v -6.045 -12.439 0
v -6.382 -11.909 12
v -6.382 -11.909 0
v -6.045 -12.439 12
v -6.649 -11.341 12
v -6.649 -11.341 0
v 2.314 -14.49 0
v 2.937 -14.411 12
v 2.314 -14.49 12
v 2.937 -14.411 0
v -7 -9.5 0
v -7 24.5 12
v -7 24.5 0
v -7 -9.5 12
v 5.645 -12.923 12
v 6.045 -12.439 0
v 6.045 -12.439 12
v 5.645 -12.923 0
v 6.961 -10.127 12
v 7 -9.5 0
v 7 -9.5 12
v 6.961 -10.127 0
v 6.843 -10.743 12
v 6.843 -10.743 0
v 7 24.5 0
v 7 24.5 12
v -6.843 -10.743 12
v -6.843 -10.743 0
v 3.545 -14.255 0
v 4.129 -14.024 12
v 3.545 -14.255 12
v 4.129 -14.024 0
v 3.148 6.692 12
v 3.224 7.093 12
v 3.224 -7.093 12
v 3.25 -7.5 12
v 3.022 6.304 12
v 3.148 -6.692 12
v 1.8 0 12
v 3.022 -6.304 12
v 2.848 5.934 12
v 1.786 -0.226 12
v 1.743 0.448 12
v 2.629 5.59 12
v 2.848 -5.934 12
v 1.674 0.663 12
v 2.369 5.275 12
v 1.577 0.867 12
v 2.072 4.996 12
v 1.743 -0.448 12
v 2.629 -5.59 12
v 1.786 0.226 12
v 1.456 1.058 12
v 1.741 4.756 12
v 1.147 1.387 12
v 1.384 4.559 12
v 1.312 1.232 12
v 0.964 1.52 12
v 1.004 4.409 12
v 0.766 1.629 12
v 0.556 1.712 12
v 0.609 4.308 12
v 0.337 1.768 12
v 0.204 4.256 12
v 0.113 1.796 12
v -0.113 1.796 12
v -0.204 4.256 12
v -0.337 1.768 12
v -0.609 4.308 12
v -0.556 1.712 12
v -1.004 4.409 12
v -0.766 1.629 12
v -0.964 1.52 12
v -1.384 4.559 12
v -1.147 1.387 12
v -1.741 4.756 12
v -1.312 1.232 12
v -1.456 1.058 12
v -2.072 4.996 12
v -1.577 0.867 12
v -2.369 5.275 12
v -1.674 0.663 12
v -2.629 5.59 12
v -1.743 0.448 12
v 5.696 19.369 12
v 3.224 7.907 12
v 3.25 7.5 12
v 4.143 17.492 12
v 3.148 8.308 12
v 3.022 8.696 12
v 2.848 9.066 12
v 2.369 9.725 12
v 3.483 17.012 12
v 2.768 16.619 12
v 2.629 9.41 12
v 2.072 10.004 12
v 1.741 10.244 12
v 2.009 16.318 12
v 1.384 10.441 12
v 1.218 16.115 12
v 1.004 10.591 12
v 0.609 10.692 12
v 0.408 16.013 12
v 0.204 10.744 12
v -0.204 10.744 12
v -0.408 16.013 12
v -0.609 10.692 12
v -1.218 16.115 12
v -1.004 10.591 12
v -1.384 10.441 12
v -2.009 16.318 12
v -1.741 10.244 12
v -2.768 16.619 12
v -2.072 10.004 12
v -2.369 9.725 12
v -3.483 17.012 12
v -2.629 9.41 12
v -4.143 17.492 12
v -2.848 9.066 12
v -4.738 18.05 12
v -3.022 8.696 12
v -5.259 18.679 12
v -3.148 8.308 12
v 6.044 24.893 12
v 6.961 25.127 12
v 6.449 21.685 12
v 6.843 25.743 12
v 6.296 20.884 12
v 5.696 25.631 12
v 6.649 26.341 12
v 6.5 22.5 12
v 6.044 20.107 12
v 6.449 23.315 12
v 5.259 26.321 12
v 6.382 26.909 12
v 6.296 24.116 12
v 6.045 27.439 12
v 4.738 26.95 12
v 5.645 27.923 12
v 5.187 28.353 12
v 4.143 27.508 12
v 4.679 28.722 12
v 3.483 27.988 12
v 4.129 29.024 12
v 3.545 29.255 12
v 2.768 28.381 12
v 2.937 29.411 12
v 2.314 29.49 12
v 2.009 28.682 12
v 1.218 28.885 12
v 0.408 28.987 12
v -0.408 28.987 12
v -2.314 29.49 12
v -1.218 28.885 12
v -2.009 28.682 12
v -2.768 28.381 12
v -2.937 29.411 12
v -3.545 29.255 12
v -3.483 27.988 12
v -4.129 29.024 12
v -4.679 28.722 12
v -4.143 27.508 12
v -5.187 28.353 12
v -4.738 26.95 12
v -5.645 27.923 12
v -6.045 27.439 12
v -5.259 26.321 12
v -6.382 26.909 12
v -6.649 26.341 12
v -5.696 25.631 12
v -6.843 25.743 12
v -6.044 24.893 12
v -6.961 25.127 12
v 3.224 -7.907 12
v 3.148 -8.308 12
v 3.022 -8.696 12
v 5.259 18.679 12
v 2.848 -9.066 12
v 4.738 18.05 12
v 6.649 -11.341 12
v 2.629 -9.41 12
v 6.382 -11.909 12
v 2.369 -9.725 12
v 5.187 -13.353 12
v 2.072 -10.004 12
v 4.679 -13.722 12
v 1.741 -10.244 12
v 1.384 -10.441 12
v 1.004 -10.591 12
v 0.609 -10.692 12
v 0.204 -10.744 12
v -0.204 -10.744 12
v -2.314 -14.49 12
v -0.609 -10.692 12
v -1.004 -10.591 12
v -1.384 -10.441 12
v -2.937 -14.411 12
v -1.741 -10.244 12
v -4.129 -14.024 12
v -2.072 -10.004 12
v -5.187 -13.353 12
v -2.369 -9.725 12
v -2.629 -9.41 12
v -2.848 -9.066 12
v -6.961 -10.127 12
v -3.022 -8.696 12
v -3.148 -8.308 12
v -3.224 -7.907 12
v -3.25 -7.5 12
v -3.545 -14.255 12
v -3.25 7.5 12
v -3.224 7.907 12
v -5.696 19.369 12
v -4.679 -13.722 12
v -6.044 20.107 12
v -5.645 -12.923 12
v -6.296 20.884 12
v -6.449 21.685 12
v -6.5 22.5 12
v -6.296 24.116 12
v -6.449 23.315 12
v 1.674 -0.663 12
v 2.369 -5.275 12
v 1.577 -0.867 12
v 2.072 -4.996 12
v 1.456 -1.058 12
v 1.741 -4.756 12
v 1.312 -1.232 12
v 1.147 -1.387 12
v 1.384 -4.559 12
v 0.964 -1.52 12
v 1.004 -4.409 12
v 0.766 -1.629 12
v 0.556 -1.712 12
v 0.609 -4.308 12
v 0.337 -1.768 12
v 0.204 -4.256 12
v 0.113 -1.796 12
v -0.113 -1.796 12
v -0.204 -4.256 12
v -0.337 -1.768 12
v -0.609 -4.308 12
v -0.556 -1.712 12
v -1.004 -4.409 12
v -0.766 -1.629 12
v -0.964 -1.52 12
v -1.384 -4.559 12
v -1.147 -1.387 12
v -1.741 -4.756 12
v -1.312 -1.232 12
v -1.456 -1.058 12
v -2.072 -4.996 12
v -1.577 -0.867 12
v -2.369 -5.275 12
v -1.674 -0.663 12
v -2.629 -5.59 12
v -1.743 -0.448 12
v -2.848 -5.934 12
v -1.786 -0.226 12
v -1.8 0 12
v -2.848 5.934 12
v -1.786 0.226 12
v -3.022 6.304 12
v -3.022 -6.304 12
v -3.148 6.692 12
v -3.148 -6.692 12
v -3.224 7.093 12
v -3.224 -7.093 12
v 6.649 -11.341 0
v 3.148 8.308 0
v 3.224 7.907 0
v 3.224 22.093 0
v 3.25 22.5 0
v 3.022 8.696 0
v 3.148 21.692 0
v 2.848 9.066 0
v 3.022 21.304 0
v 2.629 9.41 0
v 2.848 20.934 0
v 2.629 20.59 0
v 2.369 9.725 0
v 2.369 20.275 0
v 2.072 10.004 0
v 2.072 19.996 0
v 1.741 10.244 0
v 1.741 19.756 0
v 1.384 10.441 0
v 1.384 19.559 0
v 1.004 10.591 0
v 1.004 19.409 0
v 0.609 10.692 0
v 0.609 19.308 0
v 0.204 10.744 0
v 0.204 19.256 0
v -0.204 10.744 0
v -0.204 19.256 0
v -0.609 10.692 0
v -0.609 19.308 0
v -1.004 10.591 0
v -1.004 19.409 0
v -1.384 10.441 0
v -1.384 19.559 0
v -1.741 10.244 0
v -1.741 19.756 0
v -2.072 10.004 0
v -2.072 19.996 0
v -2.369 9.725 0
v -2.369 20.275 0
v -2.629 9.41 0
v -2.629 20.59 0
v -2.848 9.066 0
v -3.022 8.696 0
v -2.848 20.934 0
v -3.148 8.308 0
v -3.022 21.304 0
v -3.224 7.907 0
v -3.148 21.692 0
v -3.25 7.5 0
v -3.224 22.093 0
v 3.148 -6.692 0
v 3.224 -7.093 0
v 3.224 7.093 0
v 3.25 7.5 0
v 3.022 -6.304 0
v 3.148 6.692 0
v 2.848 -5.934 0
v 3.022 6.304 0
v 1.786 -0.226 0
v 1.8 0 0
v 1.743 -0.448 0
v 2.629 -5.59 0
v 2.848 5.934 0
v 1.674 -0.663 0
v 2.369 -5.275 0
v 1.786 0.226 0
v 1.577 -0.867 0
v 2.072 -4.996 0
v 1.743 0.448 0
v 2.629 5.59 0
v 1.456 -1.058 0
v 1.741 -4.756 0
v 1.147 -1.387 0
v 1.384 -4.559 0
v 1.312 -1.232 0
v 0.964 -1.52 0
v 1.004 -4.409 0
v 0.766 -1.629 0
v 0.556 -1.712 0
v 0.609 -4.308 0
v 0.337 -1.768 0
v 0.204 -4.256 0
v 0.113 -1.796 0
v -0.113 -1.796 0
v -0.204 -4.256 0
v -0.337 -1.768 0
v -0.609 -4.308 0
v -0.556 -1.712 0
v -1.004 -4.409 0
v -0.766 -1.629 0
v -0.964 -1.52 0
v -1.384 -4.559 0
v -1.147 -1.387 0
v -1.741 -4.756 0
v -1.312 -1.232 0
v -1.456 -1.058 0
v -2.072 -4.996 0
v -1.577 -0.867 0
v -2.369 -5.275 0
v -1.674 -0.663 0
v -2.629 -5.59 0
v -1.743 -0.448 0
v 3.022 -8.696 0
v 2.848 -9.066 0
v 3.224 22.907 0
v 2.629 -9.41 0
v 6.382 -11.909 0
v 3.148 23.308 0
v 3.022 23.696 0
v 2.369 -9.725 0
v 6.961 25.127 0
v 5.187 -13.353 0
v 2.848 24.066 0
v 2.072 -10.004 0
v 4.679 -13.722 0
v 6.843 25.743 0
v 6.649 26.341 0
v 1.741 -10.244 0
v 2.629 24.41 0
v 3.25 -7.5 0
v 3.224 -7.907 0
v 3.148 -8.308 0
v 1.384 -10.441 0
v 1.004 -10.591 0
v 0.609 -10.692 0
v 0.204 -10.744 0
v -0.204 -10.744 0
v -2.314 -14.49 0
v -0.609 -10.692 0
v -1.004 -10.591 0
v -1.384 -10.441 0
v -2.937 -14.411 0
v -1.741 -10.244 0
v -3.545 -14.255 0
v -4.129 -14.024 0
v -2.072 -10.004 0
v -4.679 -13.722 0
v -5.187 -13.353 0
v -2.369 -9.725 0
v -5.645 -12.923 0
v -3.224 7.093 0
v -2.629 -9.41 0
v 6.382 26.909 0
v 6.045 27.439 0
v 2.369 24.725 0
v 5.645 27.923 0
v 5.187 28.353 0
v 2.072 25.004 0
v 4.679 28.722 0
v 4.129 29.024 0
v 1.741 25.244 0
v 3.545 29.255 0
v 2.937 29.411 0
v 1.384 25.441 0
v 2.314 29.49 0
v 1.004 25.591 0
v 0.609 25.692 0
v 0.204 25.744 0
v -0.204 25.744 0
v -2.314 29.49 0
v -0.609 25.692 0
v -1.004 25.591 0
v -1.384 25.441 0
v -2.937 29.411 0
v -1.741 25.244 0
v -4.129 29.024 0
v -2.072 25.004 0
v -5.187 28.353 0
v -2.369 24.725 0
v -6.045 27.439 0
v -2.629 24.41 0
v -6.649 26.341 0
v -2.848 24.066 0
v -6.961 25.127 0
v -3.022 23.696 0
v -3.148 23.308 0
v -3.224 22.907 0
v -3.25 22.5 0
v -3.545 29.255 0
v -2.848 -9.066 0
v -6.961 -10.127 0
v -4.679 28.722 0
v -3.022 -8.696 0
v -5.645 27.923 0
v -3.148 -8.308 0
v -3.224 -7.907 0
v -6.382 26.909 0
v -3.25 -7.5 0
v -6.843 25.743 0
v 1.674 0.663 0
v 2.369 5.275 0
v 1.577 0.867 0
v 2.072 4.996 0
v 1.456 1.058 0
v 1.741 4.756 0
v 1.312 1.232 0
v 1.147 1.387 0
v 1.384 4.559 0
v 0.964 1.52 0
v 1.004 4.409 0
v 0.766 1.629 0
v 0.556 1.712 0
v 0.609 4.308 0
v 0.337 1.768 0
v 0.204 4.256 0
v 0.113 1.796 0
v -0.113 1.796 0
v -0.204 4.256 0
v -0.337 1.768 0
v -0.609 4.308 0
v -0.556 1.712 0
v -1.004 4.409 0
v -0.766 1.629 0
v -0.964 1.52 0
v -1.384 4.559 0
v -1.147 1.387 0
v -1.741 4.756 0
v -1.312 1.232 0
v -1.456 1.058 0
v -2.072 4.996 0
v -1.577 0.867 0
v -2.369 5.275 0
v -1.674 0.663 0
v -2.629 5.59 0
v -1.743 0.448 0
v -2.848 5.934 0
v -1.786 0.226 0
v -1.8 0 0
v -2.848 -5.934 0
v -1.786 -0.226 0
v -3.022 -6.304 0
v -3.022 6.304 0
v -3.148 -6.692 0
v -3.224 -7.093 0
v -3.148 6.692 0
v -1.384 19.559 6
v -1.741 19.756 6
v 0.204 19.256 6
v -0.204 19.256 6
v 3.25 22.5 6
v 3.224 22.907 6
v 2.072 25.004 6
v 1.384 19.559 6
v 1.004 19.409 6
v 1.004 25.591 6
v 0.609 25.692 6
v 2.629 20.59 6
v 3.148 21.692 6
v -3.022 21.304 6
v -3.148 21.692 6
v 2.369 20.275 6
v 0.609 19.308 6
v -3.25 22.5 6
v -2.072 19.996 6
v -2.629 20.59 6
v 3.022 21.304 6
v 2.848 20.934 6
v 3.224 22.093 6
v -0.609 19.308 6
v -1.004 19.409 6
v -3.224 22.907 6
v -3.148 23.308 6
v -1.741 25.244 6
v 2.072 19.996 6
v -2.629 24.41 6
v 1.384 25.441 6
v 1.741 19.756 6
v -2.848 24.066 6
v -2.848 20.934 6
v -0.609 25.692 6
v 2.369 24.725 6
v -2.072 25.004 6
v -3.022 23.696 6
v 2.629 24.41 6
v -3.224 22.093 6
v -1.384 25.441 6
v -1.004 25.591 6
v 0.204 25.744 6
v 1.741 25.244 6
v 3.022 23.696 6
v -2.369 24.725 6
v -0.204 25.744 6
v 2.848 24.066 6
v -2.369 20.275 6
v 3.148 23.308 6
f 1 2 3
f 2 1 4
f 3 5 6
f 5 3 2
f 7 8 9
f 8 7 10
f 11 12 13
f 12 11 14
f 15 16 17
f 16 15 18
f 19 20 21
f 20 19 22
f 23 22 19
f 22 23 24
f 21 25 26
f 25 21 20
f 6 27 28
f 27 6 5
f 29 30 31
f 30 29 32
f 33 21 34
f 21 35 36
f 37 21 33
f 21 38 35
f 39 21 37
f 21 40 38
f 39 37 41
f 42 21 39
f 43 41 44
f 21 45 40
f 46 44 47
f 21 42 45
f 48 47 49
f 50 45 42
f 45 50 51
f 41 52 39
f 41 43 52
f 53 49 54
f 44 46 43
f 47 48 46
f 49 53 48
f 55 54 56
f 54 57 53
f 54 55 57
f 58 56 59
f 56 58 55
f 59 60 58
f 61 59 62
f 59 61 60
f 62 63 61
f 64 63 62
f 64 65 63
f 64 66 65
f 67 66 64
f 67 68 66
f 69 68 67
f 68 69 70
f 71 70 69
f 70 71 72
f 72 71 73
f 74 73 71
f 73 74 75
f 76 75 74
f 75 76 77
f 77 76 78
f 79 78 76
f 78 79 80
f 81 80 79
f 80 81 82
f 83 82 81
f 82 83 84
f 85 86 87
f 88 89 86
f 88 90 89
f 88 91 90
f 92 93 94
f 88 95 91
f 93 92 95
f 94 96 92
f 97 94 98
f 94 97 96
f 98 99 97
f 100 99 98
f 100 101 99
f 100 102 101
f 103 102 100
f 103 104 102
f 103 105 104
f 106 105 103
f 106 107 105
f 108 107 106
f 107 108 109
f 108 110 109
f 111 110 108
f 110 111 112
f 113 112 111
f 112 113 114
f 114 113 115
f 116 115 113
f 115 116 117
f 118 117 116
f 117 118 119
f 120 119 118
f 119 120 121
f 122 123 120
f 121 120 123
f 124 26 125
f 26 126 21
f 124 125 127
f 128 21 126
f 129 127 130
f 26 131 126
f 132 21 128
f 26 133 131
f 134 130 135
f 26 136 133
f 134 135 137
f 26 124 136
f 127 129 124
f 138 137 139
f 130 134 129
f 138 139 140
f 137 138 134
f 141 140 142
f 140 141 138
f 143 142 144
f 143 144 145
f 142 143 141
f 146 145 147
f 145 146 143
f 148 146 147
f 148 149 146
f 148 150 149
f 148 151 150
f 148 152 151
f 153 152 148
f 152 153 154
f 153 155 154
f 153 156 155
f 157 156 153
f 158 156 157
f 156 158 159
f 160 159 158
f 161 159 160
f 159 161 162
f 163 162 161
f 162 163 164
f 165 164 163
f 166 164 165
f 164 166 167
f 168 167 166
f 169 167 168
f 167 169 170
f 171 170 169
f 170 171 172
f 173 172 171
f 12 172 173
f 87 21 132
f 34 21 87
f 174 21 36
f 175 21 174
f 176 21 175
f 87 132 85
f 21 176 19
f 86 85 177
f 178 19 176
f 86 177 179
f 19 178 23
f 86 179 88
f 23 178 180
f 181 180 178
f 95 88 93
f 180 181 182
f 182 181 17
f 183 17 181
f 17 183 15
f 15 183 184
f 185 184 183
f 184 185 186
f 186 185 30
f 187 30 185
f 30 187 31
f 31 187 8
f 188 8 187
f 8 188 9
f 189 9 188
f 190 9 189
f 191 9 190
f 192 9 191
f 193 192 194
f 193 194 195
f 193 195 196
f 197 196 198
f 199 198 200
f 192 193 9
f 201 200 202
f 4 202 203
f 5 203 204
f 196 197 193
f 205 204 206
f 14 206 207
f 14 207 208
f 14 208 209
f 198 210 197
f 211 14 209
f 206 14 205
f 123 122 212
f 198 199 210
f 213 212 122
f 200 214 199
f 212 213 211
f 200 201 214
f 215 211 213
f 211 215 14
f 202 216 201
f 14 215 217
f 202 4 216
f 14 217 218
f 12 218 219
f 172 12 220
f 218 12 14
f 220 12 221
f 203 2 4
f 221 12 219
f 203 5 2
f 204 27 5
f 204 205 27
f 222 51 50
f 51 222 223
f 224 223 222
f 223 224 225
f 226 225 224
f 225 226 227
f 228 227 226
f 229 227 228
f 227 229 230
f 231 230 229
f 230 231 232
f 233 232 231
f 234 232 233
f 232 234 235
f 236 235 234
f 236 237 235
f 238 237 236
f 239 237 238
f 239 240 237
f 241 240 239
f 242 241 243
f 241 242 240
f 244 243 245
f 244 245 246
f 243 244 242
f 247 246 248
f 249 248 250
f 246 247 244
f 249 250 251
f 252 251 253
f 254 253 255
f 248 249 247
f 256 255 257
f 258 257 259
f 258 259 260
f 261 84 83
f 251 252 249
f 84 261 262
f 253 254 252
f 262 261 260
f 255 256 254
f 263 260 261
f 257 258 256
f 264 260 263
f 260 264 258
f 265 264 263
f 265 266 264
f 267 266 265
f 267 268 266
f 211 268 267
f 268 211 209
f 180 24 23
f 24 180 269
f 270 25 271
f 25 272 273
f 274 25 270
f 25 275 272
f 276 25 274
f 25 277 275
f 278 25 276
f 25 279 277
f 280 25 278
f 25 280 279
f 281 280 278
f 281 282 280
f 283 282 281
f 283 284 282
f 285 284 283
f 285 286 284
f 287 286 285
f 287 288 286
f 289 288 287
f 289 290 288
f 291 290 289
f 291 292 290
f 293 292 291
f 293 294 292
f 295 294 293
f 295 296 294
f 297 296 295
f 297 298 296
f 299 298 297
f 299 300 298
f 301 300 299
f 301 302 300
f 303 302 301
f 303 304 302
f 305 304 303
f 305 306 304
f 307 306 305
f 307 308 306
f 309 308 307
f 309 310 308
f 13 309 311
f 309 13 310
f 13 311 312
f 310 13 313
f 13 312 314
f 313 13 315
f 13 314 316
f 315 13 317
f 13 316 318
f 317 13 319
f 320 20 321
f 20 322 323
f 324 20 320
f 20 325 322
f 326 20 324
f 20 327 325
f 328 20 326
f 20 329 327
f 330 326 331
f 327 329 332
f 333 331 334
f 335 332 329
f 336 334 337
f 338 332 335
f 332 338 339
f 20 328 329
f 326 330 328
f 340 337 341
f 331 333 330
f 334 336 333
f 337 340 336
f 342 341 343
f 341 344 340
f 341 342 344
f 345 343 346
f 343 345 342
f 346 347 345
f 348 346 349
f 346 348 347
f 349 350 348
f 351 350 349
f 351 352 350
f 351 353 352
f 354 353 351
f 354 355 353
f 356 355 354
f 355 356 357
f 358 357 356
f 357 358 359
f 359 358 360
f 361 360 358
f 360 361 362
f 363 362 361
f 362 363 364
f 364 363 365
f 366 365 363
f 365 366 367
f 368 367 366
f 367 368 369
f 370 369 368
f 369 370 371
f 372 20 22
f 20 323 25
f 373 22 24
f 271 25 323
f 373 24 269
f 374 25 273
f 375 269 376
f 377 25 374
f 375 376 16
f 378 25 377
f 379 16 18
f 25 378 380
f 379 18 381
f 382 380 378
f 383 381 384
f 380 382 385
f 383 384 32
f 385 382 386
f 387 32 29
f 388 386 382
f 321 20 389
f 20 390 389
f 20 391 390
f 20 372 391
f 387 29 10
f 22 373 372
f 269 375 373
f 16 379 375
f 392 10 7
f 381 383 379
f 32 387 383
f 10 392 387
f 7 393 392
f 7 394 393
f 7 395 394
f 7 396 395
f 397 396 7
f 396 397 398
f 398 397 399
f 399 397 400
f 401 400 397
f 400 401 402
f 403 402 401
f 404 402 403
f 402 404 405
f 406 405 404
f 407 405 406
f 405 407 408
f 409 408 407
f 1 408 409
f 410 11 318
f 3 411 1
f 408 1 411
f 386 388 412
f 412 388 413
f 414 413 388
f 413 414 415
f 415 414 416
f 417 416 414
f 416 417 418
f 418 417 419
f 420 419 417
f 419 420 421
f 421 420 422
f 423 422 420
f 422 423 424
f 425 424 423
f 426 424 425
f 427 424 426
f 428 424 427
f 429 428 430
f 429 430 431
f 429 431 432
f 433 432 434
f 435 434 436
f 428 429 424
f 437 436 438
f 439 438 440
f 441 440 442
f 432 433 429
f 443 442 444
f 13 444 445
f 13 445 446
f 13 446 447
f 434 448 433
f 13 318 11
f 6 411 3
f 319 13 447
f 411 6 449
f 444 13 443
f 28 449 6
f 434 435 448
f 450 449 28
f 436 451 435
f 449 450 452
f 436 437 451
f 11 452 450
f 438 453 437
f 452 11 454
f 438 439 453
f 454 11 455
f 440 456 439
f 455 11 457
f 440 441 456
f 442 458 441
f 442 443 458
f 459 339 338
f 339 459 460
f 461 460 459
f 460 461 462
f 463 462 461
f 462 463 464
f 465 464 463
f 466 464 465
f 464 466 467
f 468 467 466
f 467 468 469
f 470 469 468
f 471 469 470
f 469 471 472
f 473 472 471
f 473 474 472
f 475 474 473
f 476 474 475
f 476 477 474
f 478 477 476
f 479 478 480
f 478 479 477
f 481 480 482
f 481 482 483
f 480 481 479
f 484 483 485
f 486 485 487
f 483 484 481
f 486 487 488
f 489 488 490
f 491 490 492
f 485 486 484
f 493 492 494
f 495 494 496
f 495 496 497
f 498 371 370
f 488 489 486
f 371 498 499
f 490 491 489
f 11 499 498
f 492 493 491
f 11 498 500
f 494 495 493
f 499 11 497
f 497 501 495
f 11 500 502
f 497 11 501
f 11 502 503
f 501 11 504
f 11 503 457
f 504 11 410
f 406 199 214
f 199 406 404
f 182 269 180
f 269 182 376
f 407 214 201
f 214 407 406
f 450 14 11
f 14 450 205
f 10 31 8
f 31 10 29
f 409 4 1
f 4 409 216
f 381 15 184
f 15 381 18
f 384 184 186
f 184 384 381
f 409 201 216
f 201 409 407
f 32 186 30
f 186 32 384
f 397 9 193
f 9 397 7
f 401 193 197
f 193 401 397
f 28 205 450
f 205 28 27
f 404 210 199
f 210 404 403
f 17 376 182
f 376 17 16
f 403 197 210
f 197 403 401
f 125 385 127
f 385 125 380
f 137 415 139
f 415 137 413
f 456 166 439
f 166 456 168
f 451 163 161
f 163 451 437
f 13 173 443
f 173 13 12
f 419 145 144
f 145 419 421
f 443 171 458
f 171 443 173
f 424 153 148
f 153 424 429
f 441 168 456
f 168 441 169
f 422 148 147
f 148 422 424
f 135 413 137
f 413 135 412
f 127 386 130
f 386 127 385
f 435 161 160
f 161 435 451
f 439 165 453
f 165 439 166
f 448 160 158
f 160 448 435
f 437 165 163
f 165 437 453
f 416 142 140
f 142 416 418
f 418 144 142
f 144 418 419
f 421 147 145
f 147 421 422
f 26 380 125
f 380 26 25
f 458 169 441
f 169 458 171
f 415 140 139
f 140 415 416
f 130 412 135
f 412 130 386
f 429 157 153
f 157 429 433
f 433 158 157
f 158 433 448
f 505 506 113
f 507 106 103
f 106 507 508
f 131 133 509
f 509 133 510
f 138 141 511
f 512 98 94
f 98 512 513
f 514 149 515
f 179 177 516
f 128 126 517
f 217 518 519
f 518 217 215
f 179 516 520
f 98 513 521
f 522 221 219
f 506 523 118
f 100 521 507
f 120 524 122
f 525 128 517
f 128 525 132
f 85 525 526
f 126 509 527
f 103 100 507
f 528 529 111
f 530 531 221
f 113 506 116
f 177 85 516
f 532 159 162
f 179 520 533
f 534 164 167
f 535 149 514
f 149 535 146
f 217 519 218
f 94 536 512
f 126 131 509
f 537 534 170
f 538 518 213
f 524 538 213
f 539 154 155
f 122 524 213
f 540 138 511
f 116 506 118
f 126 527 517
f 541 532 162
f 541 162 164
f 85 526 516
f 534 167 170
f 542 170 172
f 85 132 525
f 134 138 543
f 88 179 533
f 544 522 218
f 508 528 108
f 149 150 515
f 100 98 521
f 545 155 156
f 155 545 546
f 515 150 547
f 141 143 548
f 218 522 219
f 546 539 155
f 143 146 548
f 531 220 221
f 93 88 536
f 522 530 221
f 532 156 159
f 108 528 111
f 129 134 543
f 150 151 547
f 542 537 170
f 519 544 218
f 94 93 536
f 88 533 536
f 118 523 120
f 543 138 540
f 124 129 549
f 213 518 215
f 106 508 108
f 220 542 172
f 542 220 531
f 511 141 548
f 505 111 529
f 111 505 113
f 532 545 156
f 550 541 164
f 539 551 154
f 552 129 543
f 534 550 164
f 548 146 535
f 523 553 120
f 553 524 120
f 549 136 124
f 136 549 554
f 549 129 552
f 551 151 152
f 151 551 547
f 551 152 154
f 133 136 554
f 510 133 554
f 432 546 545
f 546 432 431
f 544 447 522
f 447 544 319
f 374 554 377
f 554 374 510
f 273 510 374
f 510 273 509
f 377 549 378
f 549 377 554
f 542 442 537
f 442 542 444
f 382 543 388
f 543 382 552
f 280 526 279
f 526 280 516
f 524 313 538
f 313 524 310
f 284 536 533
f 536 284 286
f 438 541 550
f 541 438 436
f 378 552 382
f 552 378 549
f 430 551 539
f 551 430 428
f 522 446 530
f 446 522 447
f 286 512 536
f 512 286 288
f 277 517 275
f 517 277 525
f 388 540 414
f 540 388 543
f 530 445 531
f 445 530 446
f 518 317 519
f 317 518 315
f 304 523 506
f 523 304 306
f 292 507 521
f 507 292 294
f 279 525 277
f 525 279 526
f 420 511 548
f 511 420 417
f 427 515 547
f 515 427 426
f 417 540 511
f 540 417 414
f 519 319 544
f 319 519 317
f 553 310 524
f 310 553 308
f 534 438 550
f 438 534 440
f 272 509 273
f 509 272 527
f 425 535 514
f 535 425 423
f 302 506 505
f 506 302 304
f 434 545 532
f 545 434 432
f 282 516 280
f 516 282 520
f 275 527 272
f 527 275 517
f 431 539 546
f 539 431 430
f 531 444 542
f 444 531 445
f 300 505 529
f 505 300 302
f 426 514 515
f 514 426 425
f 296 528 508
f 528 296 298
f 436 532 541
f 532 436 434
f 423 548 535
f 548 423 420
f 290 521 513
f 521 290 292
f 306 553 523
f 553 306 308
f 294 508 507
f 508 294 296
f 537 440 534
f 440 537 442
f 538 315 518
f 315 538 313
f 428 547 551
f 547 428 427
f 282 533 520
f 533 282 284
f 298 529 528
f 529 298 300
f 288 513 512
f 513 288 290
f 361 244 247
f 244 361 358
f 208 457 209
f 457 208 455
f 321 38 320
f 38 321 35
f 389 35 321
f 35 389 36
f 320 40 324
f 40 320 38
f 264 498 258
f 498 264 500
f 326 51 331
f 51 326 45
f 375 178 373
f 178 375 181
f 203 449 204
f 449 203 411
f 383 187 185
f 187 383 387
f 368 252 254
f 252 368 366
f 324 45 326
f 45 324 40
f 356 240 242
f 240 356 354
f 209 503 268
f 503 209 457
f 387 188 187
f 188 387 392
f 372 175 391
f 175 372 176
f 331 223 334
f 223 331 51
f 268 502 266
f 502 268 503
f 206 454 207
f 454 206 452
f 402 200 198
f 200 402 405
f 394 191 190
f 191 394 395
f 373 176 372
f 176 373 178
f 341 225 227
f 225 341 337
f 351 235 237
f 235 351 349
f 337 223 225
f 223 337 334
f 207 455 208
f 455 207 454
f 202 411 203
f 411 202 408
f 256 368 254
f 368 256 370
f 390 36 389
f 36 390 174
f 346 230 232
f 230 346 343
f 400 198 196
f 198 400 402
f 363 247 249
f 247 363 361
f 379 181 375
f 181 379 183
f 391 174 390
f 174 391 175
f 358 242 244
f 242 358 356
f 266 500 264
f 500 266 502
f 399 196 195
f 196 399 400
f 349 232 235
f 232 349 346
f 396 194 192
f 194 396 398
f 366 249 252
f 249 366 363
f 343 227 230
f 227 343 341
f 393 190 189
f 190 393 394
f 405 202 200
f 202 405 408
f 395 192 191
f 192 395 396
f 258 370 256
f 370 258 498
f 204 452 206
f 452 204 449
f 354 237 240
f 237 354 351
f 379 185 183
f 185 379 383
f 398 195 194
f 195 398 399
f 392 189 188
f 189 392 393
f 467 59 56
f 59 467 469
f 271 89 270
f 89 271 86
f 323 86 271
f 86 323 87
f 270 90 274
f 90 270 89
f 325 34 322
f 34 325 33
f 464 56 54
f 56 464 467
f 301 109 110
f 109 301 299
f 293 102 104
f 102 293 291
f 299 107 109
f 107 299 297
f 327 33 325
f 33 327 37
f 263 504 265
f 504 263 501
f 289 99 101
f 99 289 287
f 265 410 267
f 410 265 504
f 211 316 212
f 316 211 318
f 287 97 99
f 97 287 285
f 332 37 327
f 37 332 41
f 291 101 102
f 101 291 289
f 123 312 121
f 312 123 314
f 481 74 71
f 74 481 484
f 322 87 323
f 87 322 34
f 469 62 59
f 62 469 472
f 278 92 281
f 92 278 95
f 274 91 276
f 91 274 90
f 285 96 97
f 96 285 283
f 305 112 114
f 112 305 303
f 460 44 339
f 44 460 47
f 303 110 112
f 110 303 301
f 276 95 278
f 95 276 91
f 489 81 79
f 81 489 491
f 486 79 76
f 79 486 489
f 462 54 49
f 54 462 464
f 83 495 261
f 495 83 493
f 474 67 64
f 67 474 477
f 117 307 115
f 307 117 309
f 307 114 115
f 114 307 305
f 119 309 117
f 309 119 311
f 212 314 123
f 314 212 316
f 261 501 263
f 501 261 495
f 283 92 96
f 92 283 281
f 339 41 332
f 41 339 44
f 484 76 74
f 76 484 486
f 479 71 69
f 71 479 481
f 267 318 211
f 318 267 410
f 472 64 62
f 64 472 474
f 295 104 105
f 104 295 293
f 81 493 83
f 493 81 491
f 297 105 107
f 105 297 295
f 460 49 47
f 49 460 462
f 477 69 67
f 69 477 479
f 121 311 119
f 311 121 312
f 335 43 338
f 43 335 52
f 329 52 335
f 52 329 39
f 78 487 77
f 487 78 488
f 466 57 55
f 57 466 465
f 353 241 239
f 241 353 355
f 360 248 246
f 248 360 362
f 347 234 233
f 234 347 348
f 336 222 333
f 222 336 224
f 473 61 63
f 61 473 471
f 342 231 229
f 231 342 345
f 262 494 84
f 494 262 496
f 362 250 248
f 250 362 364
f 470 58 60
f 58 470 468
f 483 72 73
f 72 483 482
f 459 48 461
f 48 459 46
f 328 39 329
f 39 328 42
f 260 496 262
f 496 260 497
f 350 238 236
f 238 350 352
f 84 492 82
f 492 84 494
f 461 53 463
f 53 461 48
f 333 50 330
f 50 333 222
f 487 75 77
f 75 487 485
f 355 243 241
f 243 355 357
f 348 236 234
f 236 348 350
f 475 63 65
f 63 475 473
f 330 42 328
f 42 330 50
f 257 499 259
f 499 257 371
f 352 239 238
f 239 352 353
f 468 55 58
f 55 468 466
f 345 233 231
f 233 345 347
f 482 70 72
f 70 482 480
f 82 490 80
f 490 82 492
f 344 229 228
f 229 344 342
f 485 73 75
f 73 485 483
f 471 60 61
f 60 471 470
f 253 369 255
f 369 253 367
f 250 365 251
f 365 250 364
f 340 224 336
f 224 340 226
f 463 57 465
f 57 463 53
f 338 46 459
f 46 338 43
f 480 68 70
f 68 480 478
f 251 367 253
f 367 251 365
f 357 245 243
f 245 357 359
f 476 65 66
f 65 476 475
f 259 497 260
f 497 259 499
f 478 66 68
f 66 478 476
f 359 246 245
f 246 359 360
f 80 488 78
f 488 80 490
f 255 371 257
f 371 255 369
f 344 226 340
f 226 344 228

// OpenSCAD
$fn = 50;


difference() {
	union() {
		hull() {
			translate(v = [-2.0000000000, 9.5000000000, 0]) {
				cylinder(h = 12, r = 5);
			}
			translate(v = [2.0000000000, 9.5000000000, 0]) {
				cylinder(h = 12, r = 5);
			}
			translate(v = [-2.0000000000, -9.5000000000, 0]) {
				cylinder(h = 12, r = 5);
			}
			translate(v = [2.0000000000, -9.5000000000, 0]) {
				cylinder(h = 12, r = 5);
			}
		}
		translate(v = [0.0000000000, 15.0000000000, 0]) {
			hull() {
				translate(v = [-2.0000000000, 9.5000000000, 0]) {
					cylinder(h = 12, r = 5);
				}
				translate(v = [2.0000000000, 9.5000000000, 0]) {
					cylinder(h = 12, r = 5);
				}
				translate(v = [-2.0000000000, -9.5000000000, 0]) {
					cylinder(h = 12, r = 5);
				}
				translate(v = [2.0000000000, -9.5000000000, 0]) {
					cylinder(h = 12, r = 5);
				}
			}
		}
		translate(v = [0.0000000000, 15.0000000000, 0]) {
			hull() {
				translate(v = [-2.0000000000, 9.5000000000, 0]) {
					cylinder(h = 12, r = 5);
				}
				translate(v = [2.0000000000, 9.5000000000, 0]) {
					cylinder(h = 12, r = 5);
				}
				translate(v = [-2.0000000000, -9.5000000000, 0]) {
					cylinder(h = 12, r = 5);
				}
				translate(v = [2.0000000000, -9.5000000000, 0]) {
					cylinder(h = 12, r = 5);
				}
			}
		}
	}
	union() {
		translate(v = [0.0000000000, 22.5000000000, 12]) {
			rotate(a = [0, 0, 0]) {
				difference() {
					union() {
						#translate(v = [0, 0, -12.0000000000]) {
							cylinder(h = 12, r = 2.2500000000);
						}
						#translate(v = [0, 0, -6]) {
							cylinder(h = 6, r1 = 3.2500000000, r2 = 6.5000000000);
						}
						#translate(v = [0, 0, -12.0000000000]) {
							cylinder(h = 12, r = 3.2500000000);
						}
						#translate(v = [0, 0, -12.0000000000]) {
							cylinder(h = 12, r = 2.2500000000);
						}
					}
					union();
				}
			}
		}
		translate(v = [0.0000000000, 22.5000000000, 12]) {
			rotate(a = [0, 0, 0]) {
				difference() {
					union() {
						#translate(v = [0, 0, -12.0000000000]) {
							cylinder(h = 12, r = 2.2500000000);
						}
						#translate(v = [0, 0, -6]) {
							cylinder(h = 6, r1 = 3.2500000000, r2 = 6.5000000000);
						}
						#translate(v = [0, 0, -12.0000000000]) {
							cylinder(h = 12, r = 3.2500000000);
						}
						#translate(v = [0, 0, -12.0000000000]) {
							cylinder(h = 12, r = 2.2500000000);
						}
					}
					union();
				}
			}
		}
		translate(v = [0.0000000000, -7.5000000000, 0]) {
			translate(v = [0, 0, -100]) {
				cylinder(h = 200, r = 3.2500000000);
			}
		}
		translate(v = [0.0000000000, 7.5000000000, 0]) {
			translate(v = [0, 0, -100]) {
				cylinder(h = 200, r = 3.2500000000);
			}
		}
		translate(v = [0.0000000000, -7.5000000000, 0]) {
			translate(v = [0, 0, -100]) {
				cylinder(h = 200, r = 1.8000000000);
			}
		}
		translate(v = [0, 0, -100]) {
			cylinder(h = 200, r = 1.8000000000);
		}
		translate(v = [0.0000000000, 7.5000000000, 0]) {
			translate(v = [0, 0, -100]) {
				cylinder(h = 200, r = 1.8000000000);
			}
		}
	}
}
